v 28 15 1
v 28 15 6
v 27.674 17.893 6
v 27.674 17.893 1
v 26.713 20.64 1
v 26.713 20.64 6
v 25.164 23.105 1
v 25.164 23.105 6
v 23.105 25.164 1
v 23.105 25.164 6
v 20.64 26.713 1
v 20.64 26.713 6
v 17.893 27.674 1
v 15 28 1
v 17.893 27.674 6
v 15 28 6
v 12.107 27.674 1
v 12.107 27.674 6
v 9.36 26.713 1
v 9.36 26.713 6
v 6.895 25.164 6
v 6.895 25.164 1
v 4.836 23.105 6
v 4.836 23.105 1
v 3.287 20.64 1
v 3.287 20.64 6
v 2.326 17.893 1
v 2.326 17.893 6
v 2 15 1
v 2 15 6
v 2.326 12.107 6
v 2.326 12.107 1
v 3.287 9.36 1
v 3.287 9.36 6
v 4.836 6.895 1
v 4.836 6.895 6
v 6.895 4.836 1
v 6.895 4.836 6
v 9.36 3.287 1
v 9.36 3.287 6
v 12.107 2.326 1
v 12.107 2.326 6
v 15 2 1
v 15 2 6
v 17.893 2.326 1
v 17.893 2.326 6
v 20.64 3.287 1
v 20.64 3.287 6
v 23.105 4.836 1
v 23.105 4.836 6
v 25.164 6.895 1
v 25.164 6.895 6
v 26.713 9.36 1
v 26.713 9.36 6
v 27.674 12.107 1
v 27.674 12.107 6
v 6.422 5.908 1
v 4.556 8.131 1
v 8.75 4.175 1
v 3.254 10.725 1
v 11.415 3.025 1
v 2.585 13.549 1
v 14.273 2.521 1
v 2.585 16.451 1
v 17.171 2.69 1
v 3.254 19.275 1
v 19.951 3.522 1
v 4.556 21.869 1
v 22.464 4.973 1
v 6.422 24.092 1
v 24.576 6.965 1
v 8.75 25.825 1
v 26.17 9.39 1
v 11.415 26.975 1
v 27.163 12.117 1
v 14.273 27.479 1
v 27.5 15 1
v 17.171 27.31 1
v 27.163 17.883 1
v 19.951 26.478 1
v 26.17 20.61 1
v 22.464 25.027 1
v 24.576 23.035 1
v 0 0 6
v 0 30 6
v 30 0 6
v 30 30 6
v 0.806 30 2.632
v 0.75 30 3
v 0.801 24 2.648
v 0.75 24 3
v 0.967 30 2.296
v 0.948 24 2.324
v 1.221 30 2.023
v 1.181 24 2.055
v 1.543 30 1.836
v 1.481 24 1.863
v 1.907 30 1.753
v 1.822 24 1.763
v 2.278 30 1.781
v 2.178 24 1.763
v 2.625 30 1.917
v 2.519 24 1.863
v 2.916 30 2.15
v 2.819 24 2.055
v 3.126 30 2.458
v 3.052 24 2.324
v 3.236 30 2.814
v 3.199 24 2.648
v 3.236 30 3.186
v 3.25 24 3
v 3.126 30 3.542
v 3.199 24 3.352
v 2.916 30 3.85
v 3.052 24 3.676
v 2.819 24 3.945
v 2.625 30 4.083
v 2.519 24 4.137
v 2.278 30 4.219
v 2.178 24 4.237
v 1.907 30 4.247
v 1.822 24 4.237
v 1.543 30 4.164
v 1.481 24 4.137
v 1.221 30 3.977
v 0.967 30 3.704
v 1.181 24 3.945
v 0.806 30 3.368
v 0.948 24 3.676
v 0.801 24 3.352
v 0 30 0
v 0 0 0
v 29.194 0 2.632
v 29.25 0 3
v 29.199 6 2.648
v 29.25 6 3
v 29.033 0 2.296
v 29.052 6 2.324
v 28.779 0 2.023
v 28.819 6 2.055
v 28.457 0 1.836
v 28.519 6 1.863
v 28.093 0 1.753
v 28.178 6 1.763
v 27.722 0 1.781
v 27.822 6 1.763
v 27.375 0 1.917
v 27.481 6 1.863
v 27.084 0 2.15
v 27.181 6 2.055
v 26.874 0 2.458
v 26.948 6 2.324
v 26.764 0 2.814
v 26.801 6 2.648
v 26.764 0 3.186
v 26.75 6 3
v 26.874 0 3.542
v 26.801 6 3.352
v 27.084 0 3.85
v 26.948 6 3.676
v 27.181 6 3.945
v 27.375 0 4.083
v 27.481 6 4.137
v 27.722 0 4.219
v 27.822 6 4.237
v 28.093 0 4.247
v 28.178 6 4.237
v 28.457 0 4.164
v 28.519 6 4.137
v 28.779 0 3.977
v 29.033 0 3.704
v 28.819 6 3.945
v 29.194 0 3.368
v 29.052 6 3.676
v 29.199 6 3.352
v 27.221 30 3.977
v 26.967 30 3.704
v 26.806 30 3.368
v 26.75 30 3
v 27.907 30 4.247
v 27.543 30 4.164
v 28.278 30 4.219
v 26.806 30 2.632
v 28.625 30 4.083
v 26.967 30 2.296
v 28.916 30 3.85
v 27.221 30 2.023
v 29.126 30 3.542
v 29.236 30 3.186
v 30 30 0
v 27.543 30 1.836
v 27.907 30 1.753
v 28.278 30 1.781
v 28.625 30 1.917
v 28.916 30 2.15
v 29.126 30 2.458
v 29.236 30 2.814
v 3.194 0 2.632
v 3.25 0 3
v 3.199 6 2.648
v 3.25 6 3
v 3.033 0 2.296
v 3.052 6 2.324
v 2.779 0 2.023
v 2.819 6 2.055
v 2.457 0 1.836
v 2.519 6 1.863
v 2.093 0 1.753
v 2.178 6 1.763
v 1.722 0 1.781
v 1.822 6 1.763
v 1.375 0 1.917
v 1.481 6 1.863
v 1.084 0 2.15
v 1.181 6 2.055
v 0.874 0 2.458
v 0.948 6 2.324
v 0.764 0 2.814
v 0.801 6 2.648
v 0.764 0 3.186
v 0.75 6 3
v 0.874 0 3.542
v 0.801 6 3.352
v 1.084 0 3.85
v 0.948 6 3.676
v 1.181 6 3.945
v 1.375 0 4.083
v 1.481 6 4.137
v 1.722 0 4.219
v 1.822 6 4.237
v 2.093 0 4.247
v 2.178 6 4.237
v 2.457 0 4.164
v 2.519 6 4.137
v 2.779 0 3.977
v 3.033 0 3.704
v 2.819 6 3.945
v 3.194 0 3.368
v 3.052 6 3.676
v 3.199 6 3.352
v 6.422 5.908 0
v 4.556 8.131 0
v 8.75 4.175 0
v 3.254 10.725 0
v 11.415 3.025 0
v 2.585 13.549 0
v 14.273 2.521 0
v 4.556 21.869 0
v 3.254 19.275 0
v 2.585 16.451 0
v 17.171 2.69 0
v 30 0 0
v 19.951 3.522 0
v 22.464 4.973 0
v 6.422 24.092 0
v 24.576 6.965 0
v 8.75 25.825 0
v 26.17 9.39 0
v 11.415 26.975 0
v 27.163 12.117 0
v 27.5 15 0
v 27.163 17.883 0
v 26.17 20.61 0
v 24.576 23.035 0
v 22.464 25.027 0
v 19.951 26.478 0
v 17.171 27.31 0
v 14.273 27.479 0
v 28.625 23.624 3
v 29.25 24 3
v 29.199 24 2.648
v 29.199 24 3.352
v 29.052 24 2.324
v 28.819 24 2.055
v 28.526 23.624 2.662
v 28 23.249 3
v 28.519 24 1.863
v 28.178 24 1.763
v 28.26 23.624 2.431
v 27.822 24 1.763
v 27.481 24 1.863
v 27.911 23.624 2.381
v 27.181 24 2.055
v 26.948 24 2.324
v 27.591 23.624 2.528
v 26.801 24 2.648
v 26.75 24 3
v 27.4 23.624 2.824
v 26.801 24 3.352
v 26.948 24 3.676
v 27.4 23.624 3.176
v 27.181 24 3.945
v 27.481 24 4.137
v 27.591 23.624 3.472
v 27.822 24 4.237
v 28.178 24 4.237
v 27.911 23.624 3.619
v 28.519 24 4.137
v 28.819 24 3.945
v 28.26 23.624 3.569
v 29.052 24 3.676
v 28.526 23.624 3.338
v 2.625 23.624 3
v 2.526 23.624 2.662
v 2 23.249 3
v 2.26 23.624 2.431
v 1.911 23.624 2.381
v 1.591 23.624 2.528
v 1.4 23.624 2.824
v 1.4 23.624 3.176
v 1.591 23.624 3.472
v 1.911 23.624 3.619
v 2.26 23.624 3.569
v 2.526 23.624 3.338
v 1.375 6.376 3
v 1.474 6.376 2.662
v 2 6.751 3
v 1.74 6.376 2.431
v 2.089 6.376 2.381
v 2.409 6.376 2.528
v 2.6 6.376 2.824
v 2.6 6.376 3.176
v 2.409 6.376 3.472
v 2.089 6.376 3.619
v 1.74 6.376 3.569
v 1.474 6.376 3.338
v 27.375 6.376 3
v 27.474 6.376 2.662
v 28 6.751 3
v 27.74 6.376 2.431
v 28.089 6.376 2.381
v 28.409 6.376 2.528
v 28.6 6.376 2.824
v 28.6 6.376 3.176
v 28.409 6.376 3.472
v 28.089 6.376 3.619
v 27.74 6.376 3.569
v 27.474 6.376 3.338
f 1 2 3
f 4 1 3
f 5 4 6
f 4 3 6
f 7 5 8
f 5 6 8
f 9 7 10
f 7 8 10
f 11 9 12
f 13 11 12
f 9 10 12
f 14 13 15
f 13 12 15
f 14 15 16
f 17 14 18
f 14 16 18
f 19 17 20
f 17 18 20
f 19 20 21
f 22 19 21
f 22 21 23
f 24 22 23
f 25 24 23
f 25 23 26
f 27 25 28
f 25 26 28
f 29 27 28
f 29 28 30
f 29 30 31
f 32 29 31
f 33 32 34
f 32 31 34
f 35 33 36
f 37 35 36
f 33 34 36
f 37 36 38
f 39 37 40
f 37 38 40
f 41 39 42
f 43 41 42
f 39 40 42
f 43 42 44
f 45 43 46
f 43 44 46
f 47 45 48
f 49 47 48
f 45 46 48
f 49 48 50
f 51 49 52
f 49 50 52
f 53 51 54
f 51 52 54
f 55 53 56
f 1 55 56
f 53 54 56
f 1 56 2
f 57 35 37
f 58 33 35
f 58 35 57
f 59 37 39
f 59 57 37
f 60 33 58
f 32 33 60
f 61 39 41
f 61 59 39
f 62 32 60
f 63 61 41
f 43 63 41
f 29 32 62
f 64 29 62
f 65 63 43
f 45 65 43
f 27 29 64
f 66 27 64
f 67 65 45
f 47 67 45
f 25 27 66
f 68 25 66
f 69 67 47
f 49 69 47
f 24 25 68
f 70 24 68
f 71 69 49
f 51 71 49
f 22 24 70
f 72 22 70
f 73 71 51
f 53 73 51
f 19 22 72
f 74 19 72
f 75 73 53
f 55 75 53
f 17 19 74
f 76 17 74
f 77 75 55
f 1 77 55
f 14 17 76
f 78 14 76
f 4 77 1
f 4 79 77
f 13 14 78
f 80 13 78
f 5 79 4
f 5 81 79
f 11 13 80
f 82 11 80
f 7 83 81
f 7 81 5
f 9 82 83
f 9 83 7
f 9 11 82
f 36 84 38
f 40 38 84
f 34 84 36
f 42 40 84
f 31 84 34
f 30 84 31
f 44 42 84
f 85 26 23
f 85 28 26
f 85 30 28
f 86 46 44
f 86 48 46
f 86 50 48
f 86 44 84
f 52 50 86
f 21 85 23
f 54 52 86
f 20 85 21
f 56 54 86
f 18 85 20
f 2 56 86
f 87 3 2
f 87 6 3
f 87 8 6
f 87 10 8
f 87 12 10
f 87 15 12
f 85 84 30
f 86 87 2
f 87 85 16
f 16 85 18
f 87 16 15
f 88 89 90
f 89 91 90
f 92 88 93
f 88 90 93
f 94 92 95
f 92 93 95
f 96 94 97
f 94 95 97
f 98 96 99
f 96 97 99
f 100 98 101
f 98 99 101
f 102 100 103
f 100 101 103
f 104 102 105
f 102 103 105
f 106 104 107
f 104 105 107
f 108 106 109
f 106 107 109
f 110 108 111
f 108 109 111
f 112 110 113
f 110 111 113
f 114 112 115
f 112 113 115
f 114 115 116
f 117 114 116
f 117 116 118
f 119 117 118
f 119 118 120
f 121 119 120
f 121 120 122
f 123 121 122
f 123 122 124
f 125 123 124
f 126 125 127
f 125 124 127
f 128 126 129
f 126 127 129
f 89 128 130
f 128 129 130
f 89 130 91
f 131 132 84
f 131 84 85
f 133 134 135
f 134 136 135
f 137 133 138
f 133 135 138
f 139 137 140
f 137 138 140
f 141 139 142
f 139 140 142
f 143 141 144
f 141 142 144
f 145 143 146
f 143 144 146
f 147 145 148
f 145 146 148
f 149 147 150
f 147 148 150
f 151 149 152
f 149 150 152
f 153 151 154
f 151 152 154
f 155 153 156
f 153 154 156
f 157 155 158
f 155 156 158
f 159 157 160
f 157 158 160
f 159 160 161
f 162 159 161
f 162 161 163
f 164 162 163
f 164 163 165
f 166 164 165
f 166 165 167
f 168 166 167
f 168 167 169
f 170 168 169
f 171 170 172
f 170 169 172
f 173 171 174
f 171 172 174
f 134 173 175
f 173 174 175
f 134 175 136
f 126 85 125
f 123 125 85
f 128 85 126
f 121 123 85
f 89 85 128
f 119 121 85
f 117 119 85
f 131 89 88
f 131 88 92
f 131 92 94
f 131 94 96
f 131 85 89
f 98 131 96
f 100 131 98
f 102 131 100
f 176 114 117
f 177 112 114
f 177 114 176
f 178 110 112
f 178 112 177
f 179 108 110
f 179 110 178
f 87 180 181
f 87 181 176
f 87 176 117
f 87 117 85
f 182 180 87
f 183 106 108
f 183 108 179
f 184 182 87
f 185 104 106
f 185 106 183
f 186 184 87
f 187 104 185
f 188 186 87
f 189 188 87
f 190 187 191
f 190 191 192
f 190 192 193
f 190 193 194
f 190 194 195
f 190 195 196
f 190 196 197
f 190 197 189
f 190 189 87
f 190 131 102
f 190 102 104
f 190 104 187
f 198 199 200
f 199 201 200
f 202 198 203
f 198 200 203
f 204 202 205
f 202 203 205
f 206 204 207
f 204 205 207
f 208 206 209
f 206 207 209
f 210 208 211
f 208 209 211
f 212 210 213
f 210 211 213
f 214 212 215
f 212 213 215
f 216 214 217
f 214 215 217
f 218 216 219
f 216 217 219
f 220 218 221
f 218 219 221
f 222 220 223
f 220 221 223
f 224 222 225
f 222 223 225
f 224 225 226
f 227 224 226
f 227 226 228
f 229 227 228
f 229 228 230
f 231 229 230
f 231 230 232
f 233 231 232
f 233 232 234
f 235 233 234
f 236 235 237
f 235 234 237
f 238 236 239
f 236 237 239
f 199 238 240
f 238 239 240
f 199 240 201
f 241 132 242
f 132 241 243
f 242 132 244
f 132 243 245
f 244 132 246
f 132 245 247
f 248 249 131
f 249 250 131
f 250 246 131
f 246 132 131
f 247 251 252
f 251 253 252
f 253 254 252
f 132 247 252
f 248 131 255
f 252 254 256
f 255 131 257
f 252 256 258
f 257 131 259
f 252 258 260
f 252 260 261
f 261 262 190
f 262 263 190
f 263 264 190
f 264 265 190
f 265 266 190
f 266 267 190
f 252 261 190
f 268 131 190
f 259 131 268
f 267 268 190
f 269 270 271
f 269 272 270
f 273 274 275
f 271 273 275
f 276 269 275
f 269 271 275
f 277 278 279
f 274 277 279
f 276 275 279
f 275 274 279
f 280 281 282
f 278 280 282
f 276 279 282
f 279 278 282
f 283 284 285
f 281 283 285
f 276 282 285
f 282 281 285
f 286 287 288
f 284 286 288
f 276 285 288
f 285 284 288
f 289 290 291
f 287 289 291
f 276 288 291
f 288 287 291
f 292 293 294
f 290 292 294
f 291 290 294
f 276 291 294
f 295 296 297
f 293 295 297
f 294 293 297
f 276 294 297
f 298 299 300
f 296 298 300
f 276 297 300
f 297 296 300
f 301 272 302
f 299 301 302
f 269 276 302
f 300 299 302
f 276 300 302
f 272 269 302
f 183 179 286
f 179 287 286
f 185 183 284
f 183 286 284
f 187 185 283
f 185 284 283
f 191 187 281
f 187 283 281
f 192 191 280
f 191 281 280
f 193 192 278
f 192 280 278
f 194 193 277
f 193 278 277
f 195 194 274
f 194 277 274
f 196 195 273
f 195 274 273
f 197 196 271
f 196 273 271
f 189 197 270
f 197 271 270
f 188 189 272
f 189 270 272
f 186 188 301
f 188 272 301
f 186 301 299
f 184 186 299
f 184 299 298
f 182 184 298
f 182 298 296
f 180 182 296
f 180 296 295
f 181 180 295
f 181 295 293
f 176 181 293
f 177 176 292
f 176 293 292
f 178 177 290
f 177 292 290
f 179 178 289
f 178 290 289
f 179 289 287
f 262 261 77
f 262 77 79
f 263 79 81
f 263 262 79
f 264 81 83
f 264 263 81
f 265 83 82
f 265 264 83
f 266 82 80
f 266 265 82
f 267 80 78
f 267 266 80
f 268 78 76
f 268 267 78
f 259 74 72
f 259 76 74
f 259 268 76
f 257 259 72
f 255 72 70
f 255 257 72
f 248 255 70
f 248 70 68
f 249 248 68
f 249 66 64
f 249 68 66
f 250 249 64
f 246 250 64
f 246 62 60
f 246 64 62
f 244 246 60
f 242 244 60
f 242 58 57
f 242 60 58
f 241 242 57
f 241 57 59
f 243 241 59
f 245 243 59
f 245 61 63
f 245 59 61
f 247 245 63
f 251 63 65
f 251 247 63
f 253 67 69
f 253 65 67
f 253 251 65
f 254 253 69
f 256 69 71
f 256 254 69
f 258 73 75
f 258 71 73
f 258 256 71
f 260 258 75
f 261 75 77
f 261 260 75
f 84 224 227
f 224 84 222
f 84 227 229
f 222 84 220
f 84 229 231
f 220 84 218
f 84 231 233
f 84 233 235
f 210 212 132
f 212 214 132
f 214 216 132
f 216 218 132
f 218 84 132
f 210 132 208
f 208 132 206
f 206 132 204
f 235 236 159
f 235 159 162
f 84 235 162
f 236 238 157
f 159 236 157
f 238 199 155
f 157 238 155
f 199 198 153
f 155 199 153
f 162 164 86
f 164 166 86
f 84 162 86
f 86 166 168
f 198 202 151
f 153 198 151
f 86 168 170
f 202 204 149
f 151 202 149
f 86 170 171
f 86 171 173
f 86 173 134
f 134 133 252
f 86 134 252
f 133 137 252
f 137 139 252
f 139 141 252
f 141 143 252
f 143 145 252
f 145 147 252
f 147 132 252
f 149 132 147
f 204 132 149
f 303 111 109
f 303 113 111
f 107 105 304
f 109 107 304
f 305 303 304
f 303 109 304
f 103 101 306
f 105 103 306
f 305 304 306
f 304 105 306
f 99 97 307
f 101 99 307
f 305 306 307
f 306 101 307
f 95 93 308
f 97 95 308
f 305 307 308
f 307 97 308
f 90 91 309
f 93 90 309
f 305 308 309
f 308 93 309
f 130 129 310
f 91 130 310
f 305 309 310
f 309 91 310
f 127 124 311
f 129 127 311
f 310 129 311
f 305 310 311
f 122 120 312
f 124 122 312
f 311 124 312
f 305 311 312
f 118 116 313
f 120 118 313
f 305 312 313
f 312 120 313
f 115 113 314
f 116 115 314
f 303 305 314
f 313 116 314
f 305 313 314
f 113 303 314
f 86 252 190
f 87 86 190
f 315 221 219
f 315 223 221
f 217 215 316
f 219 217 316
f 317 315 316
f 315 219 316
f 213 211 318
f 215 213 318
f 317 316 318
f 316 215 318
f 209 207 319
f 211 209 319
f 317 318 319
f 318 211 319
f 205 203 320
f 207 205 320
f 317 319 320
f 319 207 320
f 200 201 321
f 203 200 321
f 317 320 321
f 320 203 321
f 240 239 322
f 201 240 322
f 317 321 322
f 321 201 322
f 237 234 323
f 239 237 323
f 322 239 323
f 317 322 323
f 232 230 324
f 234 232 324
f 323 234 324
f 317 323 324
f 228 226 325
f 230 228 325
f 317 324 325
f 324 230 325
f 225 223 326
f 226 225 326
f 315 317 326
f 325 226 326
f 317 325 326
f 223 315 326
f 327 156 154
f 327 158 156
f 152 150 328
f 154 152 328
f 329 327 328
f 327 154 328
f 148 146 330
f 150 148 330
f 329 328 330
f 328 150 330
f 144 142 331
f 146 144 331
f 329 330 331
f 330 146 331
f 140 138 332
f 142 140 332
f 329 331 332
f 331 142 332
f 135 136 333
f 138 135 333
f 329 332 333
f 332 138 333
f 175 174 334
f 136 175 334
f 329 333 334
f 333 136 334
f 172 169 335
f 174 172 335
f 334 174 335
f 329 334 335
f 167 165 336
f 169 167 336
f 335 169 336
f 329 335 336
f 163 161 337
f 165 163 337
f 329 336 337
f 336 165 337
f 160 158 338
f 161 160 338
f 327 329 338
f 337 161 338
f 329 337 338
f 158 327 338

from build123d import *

# Parameters (mm, degrees)
ESQUISSE1_W                                   = 30
ESQUISSE1_H                                   = 30
ESQUISSE1_R                                   = 12.5
BOSS_EXTRU_1_DEPTH                            = 6
ESQUISSE3_R                                   = 13
ENL_V_MAT_EXTRU_1_DEPTH                       = 5
TROU_POUR_TARAUDAGE_POUR_TROU_TARAUD_M3_D     = 2.5
TROU_POUR_TARAUDAGE_POUR_TROU_TARAUD_M3_DEPTH = 6
TROU_POUR_TARAUDAGE_POUR_TROU_TARAUD_M3_TIP   = 0.751075774
TROU_POUR_TARAUDAGE_POUR_TROU_TARAUD_2_D      = 2.5
TROU_POUR_TARAUDAGE_POUR_TROU_TARAUD_2_DEPTH  = 6
TROU_POUR_TARAUDAGE_POUR_TROU_TARAUD_2_TIP    = 0.751075774


with BuildPart() as part:
    # Esquisse1 → Boss.-Extru.1 (new body)
    with BuildSketch(Plane.XY):
        with Locations((15, 15)):
            Rectangle(ESQUISSE1_W, ESQUISSE1_H)
        with Locations((15, 15)):
            Circle(ESQUISSE1_R, mode=Mode.SUBTRACT)
    extrude(amount=BOSS_EXTRU_1_DEPTH)

    # Esquisse3 → Enlèv. mat.-Extru.1 (cut)
    with BuildSketch(Plane.XY.offset(6)):
        with Locations((15, 15)):
            Circle(ESQUISSE3_R)
    extrude(amount=-ENL_V_MAT_EXTRU_1_DEPTH, mode=Mode.SUBTRACT)

    # Trou pour taraudage pour trou taraud_ M3
    with Locations(Plane(origin=(0, 30, 0), x_dir=(1, 0, 0), z_dir=(0, 1, 0))):
        with Locations((2, -3), (28, -3)):
            Hole(TROU_POUR_TARAUDAGE_POUR_TROU_TARAUD_M3_D / 2, depth=TROU_POUR_TARAUDAGE_POUR_TROU_TARAUD_M3_DEPTH)
            with Locations((0, 0, -(TROU_POUR_TARAUDAGE_POUR_TROU_TARAUD_M3_DEPTH + TROU_POUR_TARAUDAGE_POUR_TROU_TARAUD_M3_TIP / 2))):  # 118° drill point
                Cone(0, TROU_POUR_TARAUDAGE_POUR_TROU_TARAUD_M3_D / 2, TROU_POUR_TARAUDAGE_POUR_TROU_TARAUD_M3_TIP, mode=Mode.SUBTRACT)

    # Trou pour taraudage pour trou taraud 2
    with Locations(Plane(origin=(0, 0, 0), x_dir=(-1, 0, 0), z_dir=(0, -1, 0))):
        with Locations((-2, -3), (-28, -3)):
            Hole(TROU_POUR_TARAUDAGE_POUR_TROU_TARAUD_2_D / 2, depth=TROU_POUR_TARAUDAGE_POUR_TROU_TARAUD_2_DEPTH)
            with Locations((0, 0, -(TROU_POUR_TARAUDAGE_POUR_TROU_TARAUD_2_DEPTH + TROU_POUR_TARAUDAGE_POUR_TROU_TARAUD_2_TIP / 2))):  # 118° drill point
                Cone(0, TROU_POUR_TARAUDAGE_POUR_TROU_TARAUD_2_D / 2, TROU_POUR_TARAUDAGE_POUR_TROU_TARAUD_2_TIP, mode=Mode.SUBTRACT)


solid = part.part
